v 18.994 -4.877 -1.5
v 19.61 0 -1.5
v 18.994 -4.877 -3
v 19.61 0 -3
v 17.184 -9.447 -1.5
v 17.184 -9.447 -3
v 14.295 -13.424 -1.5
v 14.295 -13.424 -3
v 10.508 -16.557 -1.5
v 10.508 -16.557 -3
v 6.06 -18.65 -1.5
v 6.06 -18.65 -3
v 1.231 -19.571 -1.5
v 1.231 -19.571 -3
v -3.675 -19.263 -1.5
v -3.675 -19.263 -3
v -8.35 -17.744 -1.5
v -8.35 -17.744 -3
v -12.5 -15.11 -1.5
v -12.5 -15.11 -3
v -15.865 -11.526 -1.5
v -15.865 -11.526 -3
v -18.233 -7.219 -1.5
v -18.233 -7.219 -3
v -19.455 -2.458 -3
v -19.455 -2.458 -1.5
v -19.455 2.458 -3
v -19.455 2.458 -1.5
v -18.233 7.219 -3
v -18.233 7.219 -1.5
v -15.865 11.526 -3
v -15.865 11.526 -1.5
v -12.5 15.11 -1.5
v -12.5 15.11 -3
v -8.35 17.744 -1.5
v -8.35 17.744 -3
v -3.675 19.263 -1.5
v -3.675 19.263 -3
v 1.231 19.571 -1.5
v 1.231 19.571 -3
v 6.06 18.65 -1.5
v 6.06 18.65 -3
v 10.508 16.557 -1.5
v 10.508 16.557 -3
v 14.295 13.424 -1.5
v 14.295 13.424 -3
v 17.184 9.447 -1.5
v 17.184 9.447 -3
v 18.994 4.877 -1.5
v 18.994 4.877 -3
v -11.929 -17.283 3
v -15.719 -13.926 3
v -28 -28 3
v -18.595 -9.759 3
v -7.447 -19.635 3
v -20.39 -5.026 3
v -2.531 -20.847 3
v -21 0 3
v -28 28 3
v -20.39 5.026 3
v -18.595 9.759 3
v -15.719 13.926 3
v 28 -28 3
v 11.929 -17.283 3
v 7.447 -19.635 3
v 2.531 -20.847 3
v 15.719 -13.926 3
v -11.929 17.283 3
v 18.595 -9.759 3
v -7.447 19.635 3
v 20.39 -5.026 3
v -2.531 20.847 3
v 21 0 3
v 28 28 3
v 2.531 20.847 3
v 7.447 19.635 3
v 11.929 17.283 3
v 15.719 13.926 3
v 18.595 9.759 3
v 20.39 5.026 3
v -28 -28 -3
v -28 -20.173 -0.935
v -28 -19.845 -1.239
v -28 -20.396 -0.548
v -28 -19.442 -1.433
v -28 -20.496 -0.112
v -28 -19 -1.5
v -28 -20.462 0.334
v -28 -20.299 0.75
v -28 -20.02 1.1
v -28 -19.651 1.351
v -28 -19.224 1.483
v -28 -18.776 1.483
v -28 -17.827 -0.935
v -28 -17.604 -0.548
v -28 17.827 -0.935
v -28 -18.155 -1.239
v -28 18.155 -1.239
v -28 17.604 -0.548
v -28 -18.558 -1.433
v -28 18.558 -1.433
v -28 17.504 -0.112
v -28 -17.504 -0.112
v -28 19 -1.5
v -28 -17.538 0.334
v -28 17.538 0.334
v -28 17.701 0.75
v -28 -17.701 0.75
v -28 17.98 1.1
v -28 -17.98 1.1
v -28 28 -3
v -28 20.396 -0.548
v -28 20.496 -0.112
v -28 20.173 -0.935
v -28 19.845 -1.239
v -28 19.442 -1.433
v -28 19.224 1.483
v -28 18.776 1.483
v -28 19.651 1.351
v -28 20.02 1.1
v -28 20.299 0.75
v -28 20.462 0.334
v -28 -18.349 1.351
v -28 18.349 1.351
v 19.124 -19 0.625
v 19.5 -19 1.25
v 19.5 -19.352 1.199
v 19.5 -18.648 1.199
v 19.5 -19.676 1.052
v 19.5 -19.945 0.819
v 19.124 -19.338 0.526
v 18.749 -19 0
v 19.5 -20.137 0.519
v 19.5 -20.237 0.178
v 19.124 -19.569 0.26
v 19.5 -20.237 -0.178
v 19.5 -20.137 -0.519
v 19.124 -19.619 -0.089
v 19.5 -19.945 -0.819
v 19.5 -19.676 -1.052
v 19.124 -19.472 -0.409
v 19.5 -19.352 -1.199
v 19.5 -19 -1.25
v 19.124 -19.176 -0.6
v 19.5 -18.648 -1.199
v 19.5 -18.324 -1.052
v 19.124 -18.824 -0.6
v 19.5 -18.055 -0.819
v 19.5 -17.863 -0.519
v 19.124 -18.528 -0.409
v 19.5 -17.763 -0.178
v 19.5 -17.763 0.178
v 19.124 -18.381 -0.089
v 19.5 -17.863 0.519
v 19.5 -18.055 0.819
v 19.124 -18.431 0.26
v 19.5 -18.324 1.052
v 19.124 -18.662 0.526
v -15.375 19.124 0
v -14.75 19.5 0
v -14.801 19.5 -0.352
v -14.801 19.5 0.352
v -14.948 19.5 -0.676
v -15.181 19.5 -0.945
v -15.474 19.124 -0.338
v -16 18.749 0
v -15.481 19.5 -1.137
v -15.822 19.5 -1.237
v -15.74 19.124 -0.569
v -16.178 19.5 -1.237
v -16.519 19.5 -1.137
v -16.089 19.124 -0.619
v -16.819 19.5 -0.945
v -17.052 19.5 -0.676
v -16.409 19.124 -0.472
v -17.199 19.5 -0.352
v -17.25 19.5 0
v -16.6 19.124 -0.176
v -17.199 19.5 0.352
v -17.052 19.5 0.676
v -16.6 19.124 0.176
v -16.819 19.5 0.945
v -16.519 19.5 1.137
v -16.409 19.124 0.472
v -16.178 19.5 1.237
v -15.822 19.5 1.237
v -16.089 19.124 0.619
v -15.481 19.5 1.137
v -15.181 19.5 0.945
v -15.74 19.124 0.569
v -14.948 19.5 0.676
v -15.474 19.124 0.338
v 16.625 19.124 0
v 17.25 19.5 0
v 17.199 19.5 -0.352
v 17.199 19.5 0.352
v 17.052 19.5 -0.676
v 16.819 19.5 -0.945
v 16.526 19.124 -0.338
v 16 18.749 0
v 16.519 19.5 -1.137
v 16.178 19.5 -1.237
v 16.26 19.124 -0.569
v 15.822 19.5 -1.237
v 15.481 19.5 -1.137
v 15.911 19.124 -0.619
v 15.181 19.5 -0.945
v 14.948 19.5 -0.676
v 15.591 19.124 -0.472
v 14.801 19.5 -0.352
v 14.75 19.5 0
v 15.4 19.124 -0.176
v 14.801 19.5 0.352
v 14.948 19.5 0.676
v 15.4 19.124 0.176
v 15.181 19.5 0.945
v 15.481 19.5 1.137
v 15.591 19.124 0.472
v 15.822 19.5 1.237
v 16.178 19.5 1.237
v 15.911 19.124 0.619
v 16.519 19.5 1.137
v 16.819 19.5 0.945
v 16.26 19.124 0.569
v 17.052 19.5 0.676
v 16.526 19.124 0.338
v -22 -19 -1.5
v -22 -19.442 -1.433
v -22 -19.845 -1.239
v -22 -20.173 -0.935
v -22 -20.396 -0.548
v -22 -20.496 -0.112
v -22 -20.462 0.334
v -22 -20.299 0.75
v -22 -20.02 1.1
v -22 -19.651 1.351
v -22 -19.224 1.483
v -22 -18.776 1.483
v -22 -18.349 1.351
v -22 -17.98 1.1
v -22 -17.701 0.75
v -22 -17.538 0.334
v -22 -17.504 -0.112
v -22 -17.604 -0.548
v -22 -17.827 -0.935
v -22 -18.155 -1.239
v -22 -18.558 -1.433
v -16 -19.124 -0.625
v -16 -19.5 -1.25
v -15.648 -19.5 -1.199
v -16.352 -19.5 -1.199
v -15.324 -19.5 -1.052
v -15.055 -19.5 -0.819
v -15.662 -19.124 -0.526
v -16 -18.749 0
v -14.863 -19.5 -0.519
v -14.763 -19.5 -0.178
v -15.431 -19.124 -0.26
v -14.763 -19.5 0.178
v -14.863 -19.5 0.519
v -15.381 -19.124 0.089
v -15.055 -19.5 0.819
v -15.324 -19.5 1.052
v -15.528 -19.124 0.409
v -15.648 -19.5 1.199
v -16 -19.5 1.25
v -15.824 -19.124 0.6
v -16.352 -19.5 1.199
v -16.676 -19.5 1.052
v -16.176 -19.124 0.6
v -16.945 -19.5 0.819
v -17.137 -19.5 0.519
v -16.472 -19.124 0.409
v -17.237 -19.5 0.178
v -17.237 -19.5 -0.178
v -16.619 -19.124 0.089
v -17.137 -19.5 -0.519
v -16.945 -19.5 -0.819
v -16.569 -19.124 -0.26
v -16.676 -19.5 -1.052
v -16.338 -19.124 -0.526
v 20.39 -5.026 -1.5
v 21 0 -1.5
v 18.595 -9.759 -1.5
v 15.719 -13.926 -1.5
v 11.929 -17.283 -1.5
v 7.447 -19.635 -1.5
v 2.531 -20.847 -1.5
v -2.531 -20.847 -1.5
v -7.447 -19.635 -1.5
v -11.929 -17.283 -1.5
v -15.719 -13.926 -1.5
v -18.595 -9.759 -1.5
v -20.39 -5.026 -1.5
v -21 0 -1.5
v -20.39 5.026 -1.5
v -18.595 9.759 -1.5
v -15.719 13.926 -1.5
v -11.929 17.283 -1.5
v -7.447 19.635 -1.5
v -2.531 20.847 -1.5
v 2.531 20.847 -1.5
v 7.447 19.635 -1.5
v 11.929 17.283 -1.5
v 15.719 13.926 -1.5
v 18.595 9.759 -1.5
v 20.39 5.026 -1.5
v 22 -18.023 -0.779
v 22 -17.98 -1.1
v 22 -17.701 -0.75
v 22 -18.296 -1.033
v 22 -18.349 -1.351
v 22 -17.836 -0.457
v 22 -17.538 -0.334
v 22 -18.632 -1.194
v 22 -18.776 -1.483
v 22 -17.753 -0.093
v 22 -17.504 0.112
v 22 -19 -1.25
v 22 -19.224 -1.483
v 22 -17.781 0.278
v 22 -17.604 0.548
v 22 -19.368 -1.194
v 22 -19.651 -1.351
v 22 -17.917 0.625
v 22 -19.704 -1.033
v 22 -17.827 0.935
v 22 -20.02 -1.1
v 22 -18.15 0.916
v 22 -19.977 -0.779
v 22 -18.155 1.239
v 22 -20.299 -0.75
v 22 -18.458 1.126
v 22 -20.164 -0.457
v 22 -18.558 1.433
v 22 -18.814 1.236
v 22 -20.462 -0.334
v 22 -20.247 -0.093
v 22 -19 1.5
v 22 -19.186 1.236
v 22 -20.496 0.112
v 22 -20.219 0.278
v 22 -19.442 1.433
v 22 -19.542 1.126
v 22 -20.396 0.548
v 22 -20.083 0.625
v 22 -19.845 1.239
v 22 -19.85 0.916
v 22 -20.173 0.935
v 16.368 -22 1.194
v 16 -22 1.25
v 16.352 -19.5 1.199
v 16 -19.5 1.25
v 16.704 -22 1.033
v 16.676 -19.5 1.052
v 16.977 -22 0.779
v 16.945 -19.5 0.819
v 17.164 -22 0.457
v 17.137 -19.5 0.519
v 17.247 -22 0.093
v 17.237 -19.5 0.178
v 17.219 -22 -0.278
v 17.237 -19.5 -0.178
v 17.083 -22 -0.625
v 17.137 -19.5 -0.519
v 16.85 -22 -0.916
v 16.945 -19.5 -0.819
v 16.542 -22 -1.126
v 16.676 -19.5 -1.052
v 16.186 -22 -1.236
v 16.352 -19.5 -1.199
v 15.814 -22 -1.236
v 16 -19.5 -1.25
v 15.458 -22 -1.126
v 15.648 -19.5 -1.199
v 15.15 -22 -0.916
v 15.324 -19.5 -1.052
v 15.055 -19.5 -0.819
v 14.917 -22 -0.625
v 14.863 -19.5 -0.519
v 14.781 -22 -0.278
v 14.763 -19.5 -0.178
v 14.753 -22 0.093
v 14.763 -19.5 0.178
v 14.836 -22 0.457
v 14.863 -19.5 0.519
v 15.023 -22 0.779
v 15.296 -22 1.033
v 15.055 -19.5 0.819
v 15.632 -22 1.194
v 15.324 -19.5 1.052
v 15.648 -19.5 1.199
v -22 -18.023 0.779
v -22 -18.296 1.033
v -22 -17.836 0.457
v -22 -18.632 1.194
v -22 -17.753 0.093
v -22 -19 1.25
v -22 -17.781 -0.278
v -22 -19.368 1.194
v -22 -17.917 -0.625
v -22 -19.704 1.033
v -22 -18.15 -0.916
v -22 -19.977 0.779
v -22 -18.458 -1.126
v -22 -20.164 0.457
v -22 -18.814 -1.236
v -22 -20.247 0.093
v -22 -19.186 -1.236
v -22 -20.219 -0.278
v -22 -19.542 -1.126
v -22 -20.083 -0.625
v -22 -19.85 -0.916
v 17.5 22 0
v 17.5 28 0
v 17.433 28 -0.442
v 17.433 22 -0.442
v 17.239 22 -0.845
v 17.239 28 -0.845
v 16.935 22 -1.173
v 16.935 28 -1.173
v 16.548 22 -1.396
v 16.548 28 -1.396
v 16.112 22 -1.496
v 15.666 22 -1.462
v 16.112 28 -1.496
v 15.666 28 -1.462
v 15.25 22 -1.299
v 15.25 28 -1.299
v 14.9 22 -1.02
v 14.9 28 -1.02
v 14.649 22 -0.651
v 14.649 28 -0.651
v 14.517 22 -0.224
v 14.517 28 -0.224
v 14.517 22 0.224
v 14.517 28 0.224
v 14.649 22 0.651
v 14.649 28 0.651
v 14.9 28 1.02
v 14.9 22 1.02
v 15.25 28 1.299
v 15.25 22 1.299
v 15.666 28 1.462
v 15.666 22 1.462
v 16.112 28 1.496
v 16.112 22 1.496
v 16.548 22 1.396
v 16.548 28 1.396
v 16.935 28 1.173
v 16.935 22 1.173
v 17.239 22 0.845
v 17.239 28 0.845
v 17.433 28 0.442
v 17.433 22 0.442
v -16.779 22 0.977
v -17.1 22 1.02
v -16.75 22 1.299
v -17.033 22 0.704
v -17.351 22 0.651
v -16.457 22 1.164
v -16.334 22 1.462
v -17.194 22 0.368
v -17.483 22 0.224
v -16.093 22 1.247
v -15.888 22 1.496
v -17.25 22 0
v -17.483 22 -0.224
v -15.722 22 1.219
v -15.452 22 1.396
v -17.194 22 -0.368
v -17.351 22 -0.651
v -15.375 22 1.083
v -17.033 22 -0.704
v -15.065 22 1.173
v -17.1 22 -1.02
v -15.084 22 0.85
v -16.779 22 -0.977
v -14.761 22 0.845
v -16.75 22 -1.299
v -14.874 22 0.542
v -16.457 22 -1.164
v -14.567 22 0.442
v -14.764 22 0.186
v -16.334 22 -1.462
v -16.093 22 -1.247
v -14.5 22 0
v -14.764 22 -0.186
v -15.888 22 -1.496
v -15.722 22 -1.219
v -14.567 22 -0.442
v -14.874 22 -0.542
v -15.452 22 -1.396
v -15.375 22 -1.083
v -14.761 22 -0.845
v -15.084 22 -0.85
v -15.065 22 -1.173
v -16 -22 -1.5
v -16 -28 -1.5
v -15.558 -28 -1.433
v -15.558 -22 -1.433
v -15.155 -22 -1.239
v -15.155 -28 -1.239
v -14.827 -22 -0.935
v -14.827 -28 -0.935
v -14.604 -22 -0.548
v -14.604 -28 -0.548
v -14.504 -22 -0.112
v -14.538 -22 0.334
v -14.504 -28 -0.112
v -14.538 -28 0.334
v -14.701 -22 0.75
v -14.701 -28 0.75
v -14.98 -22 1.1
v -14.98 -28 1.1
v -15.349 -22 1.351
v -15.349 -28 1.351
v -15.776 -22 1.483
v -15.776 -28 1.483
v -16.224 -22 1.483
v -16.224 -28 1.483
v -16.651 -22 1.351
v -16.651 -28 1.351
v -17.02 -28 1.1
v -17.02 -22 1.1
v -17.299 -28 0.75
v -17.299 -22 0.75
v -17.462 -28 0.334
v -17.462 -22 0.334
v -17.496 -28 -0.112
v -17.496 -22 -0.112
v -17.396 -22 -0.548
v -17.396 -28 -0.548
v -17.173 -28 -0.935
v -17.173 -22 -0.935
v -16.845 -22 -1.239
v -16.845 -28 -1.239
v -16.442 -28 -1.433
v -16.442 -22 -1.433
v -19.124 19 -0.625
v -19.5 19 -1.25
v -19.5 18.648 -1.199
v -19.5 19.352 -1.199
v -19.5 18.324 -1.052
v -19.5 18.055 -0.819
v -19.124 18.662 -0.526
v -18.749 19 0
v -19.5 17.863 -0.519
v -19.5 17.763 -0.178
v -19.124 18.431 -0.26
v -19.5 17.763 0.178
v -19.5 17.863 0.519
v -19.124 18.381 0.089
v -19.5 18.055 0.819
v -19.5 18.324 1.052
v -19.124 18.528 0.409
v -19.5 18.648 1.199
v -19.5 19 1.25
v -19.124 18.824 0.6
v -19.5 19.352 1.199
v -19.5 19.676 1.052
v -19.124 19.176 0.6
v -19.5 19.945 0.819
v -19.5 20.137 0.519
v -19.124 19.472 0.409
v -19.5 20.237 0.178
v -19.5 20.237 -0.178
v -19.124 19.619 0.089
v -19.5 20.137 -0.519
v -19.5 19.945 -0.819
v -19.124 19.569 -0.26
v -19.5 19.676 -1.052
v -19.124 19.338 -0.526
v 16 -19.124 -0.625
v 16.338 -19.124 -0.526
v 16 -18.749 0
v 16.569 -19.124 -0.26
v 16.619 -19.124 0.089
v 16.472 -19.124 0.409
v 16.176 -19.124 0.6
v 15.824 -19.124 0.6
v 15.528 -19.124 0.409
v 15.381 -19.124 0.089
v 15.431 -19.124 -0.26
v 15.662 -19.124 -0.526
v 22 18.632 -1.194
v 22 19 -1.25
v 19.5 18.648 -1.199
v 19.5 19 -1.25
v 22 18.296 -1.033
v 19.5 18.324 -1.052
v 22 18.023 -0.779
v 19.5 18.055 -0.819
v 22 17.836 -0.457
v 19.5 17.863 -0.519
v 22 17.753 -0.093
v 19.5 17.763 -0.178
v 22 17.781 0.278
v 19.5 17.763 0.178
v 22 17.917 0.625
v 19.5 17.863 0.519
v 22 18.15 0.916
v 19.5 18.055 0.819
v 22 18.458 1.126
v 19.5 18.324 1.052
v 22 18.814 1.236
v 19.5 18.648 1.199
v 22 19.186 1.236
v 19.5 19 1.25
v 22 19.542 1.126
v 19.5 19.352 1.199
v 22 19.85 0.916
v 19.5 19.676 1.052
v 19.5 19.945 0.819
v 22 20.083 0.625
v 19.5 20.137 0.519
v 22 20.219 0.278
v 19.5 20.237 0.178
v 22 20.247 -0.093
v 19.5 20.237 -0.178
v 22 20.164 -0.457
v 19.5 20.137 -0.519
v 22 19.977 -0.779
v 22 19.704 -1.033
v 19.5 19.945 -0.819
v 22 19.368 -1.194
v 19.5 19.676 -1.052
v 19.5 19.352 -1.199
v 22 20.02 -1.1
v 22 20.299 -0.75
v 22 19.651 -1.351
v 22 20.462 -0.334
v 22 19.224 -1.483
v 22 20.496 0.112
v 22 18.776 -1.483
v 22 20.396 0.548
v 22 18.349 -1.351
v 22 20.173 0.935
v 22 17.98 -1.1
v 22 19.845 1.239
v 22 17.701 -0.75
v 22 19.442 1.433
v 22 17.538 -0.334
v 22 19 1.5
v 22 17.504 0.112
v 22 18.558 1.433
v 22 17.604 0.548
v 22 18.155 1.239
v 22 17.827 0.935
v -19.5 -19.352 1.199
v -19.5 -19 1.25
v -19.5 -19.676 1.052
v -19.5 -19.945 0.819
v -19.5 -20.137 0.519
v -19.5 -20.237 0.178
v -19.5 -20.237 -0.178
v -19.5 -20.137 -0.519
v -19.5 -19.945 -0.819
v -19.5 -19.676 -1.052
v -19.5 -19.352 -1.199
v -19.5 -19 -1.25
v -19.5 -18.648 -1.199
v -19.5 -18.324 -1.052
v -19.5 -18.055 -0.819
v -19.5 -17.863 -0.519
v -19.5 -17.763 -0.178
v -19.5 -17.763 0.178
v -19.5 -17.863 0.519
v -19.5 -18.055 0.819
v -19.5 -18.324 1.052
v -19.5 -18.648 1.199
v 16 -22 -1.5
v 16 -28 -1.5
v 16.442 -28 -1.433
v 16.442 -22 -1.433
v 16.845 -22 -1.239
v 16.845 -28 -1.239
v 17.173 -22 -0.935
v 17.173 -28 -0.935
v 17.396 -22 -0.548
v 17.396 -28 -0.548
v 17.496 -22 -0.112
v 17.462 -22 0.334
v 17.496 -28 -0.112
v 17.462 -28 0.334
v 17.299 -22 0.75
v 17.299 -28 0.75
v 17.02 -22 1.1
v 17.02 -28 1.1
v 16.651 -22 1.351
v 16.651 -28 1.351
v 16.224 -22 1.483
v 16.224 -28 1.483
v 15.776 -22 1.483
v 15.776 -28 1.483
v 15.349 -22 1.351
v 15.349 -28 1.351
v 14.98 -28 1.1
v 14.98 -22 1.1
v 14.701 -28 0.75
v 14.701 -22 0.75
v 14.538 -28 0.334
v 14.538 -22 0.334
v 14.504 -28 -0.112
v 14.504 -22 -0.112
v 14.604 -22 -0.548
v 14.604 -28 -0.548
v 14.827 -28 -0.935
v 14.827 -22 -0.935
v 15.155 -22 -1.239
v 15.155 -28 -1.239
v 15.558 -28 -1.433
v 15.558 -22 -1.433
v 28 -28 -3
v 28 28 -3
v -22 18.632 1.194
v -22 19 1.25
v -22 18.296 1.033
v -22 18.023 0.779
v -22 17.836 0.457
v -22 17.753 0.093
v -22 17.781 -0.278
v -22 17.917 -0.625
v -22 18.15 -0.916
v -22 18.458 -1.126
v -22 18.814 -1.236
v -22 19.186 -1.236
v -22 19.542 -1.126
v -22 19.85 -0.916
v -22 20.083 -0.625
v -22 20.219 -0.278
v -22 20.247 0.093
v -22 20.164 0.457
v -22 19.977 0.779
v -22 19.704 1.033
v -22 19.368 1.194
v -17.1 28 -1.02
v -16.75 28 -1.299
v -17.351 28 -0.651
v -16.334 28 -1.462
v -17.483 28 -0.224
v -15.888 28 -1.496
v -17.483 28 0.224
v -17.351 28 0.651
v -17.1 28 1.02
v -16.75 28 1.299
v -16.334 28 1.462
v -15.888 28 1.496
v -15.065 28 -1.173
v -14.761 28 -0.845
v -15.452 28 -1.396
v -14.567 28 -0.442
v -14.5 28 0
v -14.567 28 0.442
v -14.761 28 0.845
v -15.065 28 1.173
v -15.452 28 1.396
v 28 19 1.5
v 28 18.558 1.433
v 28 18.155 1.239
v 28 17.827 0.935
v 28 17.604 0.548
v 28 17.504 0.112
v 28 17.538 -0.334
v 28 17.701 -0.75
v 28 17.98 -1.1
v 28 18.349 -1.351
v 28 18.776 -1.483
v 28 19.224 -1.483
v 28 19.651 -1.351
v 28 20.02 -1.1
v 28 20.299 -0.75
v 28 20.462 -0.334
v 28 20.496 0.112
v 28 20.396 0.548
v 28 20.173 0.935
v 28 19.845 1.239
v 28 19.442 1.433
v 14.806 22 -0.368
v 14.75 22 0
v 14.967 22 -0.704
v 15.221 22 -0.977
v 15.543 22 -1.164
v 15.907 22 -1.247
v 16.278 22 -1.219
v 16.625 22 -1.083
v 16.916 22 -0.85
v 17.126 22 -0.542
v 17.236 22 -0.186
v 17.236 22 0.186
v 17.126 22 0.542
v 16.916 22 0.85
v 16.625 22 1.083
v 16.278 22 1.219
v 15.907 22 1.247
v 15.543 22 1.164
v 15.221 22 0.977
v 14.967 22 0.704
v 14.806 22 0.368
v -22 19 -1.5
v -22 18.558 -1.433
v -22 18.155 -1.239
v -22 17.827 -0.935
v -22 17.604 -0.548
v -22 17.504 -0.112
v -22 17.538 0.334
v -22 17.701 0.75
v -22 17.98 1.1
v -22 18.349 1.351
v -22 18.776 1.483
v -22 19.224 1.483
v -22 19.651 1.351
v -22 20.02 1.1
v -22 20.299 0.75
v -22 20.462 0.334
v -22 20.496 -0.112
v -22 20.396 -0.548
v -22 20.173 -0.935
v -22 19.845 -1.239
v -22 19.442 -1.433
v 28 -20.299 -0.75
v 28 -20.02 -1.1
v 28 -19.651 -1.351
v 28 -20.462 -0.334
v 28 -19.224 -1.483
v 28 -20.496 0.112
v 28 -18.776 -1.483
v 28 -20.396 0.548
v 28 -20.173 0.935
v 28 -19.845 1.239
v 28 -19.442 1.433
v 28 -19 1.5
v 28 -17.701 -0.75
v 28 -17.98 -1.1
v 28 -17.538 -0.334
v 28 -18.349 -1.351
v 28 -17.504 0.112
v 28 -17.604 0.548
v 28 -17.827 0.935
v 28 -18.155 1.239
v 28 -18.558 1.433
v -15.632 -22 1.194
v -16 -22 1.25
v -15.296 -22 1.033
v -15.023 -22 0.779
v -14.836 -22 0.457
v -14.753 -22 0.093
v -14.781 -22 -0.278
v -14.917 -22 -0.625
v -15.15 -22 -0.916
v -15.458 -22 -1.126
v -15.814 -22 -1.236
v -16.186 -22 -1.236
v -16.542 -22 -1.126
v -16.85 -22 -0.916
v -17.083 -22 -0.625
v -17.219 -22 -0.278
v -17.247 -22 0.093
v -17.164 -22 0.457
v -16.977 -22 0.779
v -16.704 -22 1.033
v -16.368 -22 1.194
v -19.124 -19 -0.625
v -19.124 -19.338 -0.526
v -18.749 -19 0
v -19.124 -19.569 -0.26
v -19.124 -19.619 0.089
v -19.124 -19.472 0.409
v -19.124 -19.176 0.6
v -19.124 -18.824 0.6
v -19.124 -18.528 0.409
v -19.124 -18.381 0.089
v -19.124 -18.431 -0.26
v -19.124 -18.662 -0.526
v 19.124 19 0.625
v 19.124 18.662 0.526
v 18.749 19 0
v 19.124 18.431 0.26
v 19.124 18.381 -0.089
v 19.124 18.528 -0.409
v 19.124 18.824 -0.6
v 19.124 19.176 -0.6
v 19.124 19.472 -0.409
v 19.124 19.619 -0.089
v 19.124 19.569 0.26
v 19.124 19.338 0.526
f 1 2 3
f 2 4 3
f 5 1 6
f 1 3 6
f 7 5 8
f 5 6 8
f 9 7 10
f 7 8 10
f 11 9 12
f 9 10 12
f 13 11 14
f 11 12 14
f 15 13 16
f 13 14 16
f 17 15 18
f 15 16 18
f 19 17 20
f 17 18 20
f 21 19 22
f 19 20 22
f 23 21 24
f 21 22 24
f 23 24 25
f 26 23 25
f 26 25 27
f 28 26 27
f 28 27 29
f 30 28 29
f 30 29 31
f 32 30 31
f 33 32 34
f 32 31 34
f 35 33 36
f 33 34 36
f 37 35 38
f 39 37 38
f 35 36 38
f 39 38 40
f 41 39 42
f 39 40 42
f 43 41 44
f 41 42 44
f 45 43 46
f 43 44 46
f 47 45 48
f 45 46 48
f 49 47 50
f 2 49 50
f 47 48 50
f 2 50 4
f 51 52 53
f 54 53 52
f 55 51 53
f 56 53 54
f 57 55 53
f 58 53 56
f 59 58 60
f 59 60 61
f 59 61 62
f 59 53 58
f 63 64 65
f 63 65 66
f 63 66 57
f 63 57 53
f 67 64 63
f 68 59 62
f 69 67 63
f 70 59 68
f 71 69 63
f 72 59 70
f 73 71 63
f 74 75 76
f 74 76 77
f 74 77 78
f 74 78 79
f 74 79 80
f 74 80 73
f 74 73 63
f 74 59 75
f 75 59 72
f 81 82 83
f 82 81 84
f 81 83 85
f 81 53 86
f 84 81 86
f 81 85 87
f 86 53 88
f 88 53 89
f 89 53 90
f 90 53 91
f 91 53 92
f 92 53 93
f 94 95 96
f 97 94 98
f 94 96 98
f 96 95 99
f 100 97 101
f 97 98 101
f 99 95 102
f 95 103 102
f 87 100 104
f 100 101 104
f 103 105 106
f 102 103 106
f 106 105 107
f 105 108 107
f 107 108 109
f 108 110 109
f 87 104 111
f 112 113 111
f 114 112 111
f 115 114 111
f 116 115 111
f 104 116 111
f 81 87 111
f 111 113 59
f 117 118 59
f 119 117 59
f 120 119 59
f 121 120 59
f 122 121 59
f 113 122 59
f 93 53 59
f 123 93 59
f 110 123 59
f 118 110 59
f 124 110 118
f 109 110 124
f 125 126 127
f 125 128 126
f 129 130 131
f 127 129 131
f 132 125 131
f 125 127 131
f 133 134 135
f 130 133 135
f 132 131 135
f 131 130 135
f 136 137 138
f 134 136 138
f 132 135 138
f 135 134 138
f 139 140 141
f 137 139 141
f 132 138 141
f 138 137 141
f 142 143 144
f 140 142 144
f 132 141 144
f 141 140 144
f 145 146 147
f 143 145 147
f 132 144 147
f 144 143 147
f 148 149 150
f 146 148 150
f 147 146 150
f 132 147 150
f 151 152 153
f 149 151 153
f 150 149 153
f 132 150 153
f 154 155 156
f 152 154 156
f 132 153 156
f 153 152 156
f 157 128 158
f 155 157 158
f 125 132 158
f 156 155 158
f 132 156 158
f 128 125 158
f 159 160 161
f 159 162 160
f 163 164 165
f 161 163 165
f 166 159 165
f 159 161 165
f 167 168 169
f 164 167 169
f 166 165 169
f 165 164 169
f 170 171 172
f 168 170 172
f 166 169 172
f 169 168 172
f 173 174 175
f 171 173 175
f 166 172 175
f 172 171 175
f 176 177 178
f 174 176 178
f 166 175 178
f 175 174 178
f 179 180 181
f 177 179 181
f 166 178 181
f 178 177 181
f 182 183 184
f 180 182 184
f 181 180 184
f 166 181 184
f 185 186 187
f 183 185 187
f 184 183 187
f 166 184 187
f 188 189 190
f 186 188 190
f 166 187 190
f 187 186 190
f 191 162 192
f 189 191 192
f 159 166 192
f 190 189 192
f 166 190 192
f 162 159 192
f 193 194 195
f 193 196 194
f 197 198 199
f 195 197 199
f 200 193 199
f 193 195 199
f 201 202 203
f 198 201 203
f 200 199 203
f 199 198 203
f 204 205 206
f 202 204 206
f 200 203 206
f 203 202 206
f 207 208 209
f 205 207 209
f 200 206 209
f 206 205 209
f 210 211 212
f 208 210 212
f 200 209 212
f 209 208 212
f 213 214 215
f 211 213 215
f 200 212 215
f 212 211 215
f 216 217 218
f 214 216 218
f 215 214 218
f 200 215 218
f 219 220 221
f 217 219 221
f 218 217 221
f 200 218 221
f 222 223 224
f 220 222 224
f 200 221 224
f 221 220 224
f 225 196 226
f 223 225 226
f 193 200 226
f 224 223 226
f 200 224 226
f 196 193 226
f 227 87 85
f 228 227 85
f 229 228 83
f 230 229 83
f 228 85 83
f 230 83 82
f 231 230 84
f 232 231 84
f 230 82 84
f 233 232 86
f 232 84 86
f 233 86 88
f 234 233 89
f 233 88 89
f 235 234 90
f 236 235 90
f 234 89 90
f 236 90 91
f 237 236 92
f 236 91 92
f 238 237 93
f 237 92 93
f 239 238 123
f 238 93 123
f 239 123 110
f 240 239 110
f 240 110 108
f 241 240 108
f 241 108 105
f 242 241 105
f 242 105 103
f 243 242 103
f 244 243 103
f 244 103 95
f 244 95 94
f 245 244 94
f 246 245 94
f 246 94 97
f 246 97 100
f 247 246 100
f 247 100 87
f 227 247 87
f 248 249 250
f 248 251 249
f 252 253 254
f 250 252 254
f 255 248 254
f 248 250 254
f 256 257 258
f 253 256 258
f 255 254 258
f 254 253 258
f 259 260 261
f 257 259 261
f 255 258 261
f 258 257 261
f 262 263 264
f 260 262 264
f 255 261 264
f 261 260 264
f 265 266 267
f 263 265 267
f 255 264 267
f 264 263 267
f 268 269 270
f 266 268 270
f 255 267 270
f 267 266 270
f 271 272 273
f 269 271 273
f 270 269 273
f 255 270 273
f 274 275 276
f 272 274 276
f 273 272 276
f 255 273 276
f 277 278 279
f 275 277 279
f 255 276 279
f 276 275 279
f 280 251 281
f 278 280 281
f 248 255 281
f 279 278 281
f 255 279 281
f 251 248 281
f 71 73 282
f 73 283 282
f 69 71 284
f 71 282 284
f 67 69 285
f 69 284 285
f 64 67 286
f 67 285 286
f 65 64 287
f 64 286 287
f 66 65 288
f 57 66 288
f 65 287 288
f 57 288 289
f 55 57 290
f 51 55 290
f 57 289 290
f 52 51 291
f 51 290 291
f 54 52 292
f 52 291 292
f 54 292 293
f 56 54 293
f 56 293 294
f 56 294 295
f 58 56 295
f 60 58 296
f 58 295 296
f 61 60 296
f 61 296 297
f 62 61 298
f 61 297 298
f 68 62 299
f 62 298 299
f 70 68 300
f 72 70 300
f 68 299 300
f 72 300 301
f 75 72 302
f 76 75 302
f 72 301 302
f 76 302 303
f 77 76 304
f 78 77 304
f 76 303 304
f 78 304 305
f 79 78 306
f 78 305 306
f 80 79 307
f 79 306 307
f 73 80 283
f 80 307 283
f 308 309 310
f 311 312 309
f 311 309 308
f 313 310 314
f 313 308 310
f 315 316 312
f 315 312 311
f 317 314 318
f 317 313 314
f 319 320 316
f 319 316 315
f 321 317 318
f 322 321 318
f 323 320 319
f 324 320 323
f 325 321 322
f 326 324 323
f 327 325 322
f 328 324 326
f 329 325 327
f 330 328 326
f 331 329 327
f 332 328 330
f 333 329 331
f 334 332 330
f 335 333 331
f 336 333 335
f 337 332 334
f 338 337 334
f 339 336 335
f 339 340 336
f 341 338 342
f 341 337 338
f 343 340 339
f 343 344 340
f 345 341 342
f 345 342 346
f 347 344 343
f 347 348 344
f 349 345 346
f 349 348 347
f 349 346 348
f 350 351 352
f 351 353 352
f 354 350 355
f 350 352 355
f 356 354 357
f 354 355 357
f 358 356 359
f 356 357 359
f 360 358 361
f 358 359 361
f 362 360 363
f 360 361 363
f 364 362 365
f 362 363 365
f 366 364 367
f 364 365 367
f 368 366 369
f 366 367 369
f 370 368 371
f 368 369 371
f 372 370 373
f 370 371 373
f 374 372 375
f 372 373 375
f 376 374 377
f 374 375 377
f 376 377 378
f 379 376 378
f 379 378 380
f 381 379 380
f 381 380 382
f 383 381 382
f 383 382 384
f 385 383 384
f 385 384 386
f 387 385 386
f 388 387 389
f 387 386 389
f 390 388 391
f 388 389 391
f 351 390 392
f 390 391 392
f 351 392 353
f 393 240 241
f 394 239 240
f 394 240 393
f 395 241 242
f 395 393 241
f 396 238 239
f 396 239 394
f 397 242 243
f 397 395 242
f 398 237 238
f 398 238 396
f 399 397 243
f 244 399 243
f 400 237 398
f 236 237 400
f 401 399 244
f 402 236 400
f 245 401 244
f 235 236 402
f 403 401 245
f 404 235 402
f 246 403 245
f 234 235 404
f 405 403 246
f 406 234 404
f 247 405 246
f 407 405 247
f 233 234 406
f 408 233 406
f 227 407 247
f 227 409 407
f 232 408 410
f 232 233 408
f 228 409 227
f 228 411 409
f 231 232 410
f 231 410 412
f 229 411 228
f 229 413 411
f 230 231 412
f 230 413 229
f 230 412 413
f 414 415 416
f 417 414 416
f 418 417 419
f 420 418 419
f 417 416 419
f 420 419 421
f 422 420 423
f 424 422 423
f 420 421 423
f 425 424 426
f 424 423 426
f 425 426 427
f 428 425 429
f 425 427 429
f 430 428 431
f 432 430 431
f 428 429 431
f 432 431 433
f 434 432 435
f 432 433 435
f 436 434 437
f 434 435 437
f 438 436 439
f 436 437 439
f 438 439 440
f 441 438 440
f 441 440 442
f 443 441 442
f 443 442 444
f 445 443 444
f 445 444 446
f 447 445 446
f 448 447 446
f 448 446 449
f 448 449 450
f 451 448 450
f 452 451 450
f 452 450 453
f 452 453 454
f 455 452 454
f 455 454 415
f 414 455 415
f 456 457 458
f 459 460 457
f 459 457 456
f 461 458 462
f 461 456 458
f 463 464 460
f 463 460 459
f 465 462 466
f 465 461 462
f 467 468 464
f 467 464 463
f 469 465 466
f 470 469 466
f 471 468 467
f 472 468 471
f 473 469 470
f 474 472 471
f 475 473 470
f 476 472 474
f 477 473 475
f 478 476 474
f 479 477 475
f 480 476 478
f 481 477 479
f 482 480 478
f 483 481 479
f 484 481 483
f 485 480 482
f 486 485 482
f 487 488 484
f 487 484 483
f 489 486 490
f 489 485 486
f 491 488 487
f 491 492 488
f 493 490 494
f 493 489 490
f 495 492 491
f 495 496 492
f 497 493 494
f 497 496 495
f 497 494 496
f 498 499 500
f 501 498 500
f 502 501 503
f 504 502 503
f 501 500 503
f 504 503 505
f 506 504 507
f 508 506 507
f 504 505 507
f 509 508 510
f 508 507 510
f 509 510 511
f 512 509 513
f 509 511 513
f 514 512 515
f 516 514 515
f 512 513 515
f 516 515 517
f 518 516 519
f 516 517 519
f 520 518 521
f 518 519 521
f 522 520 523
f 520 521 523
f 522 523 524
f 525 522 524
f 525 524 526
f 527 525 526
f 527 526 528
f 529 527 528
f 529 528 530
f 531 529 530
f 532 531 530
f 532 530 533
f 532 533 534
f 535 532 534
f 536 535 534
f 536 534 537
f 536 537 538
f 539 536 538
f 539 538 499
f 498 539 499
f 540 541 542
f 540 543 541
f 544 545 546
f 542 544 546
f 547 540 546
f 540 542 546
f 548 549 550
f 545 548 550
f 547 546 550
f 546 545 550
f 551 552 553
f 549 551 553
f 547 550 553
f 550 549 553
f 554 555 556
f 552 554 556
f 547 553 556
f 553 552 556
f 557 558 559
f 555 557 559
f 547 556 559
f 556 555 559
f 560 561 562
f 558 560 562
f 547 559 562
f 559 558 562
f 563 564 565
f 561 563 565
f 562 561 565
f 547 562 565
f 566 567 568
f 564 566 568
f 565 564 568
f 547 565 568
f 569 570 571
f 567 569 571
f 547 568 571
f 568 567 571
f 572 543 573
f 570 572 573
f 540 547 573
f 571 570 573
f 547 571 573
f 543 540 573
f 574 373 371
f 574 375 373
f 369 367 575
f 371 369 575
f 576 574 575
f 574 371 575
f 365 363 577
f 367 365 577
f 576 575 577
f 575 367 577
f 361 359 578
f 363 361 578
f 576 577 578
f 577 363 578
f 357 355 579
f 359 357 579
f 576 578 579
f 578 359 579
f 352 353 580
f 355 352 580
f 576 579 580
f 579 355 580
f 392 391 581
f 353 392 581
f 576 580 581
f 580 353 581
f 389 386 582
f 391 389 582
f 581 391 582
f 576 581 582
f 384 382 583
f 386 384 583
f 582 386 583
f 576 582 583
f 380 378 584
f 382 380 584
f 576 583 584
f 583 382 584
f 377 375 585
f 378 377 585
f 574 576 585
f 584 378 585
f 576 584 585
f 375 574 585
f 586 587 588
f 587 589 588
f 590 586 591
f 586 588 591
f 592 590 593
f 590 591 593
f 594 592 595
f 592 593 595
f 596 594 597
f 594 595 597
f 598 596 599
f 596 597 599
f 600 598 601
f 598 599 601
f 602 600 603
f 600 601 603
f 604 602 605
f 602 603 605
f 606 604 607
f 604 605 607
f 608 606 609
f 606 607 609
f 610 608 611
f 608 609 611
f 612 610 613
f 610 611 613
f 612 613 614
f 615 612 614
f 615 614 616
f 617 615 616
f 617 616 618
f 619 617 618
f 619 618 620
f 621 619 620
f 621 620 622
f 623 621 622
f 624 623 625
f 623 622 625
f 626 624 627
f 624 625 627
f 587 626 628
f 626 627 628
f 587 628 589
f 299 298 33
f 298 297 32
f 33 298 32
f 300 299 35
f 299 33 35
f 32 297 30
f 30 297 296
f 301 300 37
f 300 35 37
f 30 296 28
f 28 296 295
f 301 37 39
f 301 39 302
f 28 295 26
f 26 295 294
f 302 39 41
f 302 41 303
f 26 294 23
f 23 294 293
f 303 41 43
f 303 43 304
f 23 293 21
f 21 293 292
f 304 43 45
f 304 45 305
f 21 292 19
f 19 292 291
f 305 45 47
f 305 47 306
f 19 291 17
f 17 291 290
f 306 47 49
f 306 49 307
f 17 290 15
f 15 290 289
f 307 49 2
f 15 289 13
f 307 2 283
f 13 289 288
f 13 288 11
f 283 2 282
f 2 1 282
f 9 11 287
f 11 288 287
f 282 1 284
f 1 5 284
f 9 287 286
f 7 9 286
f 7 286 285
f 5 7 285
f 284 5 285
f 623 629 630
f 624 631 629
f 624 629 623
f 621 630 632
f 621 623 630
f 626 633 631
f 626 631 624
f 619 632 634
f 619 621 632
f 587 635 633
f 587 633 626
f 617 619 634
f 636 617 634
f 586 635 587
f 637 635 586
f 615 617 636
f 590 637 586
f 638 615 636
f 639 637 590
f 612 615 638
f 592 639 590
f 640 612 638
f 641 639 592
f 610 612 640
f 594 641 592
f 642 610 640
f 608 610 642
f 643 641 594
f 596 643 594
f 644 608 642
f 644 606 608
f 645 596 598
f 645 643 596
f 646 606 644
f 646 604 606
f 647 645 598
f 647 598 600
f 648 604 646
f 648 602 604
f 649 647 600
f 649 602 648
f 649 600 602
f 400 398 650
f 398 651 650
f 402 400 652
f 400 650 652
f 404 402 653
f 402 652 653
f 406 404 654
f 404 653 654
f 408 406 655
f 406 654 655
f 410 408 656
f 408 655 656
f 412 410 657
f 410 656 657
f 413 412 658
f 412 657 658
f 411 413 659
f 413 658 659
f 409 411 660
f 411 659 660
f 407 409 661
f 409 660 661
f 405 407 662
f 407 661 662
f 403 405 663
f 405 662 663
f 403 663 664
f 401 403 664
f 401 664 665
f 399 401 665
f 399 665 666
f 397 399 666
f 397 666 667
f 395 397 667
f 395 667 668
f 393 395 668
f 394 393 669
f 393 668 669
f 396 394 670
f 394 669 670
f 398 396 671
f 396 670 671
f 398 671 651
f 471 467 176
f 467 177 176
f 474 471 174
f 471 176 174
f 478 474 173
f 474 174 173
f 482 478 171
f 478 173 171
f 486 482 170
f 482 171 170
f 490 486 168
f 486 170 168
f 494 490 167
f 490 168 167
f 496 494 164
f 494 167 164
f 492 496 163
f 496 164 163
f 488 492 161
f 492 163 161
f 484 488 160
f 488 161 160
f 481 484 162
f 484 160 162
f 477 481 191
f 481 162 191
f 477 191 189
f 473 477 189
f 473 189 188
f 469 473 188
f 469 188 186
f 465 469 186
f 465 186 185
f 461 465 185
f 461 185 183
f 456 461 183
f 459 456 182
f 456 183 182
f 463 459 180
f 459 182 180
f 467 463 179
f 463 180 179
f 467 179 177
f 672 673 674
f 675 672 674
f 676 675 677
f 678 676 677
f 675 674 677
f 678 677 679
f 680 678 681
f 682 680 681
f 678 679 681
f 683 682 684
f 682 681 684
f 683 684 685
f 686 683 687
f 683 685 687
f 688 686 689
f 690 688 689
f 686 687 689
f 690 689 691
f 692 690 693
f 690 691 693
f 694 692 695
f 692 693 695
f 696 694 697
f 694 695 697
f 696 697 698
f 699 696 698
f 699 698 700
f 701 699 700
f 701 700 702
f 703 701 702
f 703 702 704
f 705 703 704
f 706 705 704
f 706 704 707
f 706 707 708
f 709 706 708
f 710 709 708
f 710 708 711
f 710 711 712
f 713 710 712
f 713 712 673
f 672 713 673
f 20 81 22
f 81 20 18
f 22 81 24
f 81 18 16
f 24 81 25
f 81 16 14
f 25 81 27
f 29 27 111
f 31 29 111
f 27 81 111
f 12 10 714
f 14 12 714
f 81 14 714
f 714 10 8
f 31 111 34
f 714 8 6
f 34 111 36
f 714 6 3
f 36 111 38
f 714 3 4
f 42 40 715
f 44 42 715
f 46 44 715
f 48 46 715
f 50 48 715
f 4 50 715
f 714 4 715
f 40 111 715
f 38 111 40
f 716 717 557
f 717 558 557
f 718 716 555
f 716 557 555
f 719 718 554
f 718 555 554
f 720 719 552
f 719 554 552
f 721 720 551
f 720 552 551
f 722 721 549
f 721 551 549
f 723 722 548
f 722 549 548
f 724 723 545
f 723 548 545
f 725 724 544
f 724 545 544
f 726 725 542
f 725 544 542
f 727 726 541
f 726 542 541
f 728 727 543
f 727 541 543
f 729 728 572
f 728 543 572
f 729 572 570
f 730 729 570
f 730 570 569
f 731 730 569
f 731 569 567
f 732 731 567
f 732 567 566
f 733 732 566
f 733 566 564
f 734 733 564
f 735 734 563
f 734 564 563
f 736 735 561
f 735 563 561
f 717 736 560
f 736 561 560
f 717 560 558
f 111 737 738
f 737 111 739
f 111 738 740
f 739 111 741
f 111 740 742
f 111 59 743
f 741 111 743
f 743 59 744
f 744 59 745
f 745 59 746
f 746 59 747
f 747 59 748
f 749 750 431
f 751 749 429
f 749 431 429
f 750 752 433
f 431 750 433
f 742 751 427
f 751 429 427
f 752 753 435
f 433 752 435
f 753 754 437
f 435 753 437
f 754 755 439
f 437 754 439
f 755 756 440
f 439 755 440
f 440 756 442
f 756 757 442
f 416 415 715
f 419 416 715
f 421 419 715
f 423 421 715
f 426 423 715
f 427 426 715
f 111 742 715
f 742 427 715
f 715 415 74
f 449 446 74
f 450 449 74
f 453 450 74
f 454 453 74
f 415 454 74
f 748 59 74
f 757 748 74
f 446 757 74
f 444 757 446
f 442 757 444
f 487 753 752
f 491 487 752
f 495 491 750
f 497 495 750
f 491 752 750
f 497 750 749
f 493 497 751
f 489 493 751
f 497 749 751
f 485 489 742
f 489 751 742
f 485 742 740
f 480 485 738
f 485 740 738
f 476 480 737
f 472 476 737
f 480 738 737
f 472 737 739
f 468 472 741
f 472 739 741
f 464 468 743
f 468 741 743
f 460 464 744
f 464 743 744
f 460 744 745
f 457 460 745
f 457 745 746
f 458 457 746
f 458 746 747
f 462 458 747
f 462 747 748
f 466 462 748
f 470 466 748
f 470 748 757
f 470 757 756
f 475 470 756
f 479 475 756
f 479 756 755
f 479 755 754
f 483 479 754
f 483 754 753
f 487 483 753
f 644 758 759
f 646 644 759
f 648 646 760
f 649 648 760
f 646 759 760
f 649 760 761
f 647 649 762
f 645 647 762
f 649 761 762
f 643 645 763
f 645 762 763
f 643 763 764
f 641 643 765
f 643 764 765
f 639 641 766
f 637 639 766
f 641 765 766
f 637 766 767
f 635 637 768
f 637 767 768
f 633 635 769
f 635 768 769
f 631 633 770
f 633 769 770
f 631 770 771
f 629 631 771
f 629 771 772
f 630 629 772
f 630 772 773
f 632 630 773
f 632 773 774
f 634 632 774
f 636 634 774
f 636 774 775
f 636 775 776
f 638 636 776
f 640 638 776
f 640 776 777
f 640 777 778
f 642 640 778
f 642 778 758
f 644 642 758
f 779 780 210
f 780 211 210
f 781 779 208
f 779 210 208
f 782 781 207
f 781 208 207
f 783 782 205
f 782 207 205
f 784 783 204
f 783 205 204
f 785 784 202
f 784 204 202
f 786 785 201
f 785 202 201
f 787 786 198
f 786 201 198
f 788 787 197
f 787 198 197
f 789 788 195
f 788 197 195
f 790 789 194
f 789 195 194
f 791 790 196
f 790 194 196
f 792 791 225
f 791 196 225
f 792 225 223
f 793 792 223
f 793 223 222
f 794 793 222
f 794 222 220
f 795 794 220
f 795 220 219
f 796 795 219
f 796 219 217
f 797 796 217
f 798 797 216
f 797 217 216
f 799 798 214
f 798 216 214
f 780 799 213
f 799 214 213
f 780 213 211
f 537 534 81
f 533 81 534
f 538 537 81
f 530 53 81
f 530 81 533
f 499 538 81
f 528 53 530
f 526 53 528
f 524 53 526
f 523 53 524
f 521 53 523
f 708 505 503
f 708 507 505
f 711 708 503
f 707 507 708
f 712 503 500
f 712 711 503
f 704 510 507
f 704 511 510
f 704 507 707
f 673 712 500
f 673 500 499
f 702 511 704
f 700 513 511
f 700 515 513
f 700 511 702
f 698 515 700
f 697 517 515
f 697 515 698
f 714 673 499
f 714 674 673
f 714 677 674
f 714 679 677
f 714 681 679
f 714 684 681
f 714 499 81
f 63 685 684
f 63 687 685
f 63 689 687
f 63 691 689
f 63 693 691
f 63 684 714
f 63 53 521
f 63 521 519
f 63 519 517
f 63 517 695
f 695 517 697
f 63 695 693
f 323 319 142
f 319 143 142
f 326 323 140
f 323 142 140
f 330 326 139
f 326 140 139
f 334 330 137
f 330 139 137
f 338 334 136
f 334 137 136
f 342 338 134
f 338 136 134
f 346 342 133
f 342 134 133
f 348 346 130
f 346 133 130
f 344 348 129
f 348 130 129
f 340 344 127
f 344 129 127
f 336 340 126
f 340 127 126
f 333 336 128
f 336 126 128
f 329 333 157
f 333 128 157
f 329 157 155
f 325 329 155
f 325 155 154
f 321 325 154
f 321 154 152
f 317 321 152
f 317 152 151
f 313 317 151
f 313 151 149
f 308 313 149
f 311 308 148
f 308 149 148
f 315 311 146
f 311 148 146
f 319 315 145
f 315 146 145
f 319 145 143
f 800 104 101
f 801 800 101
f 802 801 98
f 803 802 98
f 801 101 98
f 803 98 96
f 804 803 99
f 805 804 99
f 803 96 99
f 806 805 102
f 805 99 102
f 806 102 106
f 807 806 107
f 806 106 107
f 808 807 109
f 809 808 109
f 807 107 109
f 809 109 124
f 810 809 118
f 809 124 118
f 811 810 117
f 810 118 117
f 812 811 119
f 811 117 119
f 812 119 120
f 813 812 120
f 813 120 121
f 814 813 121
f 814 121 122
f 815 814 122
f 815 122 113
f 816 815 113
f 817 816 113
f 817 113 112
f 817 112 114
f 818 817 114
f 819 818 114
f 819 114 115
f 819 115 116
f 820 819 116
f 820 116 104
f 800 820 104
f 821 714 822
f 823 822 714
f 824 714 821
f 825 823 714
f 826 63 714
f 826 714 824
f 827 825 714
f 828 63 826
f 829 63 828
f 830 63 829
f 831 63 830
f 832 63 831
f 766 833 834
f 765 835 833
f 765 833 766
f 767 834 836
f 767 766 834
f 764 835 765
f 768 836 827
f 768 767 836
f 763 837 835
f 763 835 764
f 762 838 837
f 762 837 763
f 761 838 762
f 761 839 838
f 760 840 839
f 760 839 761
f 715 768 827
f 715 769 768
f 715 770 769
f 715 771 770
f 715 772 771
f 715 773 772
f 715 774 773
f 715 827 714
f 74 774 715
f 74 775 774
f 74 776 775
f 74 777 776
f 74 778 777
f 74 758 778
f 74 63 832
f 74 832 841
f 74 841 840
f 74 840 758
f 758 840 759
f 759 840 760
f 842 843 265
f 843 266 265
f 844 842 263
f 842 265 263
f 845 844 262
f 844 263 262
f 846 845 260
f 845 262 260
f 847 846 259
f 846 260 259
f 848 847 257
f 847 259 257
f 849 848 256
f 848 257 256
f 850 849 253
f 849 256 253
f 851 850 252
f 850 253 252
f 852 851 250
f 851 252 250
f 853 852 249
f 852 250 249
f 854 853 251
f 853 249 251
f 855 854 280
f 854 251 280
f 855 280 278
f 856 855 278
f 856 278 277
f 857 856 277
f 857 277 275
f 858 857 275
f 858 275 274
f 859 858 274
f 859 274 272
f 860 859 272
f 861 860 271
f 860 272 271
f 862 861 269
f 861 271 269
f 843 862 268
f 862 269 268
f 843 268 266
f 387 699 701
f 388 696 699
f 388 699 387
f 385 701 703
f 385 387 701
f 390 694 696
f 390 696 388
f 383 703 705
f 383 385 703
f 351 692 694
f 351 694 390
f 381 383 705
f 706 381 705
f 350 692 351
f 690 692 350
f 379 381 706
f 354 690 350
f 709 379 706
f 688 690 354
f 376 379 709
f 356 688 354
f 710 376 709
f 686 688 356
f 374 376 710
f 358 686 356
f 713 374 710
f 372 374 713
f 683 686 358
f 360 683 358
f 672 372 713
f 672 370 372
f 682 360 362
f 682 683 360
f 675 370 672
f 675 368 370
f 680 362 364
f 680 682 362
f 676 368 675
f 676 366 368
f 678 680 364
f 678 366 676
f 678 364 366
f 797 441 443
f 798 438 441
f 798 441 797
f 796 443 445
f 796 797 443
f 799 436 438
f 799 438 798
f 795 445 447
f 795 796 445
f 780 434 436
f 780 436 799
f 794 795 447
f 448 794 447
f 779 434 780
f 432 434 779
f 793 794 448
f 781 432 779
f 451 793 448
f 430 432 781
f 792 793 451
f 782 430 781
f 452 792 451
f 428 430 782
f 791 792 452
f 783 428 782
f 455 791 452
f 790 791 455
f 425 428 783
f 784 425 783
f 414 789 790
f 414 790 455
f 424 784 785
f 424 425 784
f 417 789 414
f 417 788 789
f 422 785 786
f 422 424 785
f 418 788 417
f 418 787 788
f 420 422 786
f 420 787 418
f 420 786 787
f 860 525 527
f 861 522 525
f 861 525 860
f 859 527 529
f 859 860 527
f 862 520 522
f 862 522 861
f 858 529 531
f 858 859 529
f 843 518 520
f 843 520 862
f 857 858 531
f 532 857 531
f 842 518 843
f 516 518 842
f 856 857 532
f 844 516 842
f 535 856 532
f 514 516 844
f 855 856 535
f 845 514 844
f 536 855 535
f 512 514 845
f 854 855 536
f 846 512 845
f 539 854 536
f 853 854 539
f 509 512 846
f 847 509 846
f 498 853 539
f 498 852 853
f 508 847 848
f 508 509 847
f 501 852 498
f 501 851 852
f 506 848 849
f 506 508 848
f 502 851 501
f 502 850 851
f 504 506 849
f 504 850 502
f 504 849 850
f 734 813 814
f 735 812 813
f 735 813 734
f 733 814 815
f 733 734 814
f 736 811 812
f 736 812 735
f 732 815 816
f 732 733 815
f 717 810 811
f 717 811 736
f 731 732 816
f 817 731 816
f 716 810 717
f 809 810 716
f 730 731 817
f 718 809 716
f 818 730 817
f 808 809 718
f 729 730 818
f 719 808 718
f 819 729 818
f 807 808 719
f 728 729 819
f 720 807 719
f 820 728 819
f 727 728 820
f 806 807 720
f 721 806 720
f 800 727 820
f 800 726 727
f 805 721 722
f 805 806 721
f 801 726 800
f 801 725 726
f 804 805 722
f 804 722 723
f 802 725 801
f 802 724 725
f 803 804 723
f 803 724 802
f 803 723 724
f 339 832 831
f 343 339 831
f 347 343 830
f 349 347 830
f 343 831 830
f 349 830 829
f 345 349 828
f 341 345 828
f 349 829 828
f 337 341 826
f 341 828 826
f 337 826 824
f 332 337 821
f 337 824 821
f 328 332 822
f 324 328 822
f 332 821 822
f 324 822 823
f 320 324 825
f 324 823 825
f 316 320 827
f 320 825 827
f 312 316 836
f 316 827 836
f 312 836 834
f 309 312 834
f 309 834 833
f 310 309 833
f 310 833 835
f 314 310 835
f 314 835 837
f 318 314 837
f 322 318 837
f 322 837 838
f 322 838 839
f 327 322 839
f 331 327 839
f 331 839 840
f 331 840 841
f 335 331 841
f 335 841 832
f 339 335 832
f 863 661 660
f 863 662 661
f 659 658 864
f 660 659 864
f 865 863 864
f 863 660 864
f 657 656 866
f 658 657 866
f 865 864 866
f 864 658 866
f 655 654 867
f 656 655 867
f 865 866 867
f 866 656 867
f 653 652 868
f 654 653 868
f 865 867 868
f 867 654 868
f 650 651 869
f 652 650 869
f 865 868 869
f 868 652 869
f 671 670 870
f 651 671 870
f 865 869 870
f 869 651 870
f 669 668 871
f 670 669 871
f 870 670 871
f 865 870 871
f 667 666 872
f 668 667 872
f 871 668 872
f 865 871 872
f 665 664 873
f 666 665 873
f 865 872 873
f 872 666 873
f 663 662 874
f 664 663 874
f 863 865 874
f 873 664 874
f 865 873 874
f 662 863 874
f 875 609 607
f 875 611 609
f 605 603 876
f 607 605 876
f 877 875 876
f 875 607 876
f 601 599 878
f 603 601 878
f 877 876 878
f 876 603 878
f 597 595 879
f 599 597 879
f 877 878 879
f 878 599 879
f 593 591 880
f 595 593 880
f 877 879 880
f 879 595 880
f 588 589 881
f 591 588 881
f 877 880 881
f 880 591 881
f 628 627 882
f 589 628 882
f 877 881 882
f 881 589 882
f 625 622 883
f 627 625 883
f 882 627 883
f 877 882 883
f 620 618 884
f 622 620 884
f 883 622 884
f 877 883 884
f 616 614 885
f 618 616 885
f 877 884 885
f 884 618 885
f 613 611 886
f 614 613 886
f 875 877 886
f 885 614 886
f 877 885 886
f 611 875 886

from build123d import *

# Parameters (mm, degrees)
SKETCH_2_W                     = 56
SKETCH_2_H                     = 56
EXTRUDE_1_DEPTH                = 3
M3X0_5_1_D                     = 2.5
M3X0_5_1_DEPTH                 = 8.5
M3X0_5_1_CBORE_D               = 3
M3X0_5_1_CBORE_DEPTH           = 6
M3X0_5_1_TIP                   = 0.751075774
M3X0_5_1_ON_FACE_2_D           = 2.5
M3X0_5_1_ON_FACE_2_DEPTH       = 8.5
M3X0_5_1_ON_FACE_2_CBORE_D     = 3
M3X0_5_1_ON_FACE_2_CBORE_DEPTH = 6
M3X0_5_1_ON_FACE_2_TIP         = 0.751075774
M3X0_5_1_ON_FACE_3_D           = 2.5
M3X0_5_1_ON_FACE_3_DEPTH       = 8.5
M3X0_5_1_ON_FACE_3_CBORE_D     = 3
M3X0_5_1_ON_FACE_3_CBORE_DEPTH = 6
M3X0_5_1_ON_FACE_3_TIP         = 0.751075774
M3X0_5_1_ON_FACE_4_D           = 2.5
M3X0_5_1_ON_FACE_4_DEPTH       = 8.5
M3X0_5_1_ON_FACE_4_CBORE_D     = 3
M3X0_5_1_ON_FACE_4_CBORE_DEPTH = 6
M3X0_5_1_ON_FACE_4_TIP         = 0.751075774


with BuildPart() as part:
    # ｽｹｯﾁ2 → ﾎﾞｽ - 押し出し1 (new, symmetric)
    with BuildSketch(Plane.XY):
        Rectangle(SKETCH_2_W, SKETCH_2_H)
    extrude(amount=EXTRUDE_1_DEPTH, both=True)

    # ｽｹｯﾁ3 → ｶｯﾄ - 回転1 (revolve, cut)
    with BuildSketch(Plane(origin=(0, 0, 0), x_dir=(0, 0, -1), z_dir=(1, 0, 0)), mode=Mode.PRIVATE) as cut_revolve_1_sk:
        Polygon((-3, 21), (1.5, 21), (1.5, 19.61), (3, 19.61), (3, 0), (-3, 0), align=None)
    revolve(cut_revolve_1_sk.sketch.rotate(Axis((0, 0, 0), (0, 0, -1)), 90), axis=Axis((0, 0, 0), (0, 0, -1)), mode=Mode.SUBTRACT)

    # M3x0.5 ねじ穴1
    with Locations(Plane(origin=(-16, 28, 0), x_dir=(1, 0, 0), z_dir=(0, 1, 0))):
        with Locations((0, 0), (32, 0)):
            CounterBoreHole(M3X0_5_1_D / 2, M3X0_5_1_CBORE_D / 2, M3X0_5_1_CBORE_DEPTH, depth=M3X0_5_1_DEPTH)
            with Locations((0, 0, -(M3X0_5_1_DEPTH + M3X0_5_1_TIP / 2))):  # 118° drill point
                Cone(0, M3X0_5_1_D / 2, M3X0_5_1_TIP, mode=Mode.SUBTRACT)

    # M3x0.5 ねじ穴1 on face 2
    with Locations(Plane(origin=(28, 19, 0), x_dir=(0, 0, 1), z_dir=(1, 0, 0))):
        with Locations((0, 0), (0, 38)):
            CounterBoreHole(M3X0_5_1_ON_FACE_2_D / 2, M3X0_5_1_ON_FACE_2_CBORE_D / 2, M3X0_5_1_ON_FACE_2_CBORE_DEPTH, depth=M3X0_5_1_ON_FACE_2_DEPTH)
            with Locations((0, 0, -(M3X0_5_1_ON_FACE_2_DEPTH + M3X0_5_1_ON_FACE_2_TIP / 2))):  # 118° drill point
                Cone(0, M3X0_5_1_ON_FACE_2_D / 2, M3X0_5_1_ON_FACE_2_TIP, mode=Mode.SUBTRACT)

    # M3x0.5 ねじ穴1 on face 3
    with Locations(Plane(origin=(16, -28, 0), x_dir=(0, 0, -1), z_dir=(0, -1, 0))):
        with Locations((0, 0), (0, -32)):
            CounterBoreHole(M3X0_5_1_ON_FACE_3_D / 2, M3X0_5_1_ON_FACE_3_CBORE_D / 2, M3X0_5_1_ON_FACE_3_CBORE_DEPTH, depth=M3X0_5_1_ON_FACE_3_DEPTH)
            with Locations((0, 0, -(M3X0_5_1_ON_FACE_3_DEPTH + M3X0_5_1_ON_FACE_3_TIP / 2))):  # 118° drill point
                Cone(0, M3X0_5_1_ON_FACE_3_D / 2, M3X0_5_1_ON_FACE_3_TIP, mode=Mode.SUBTRACT)

    # M3x0.5 ねじ穴1 on face 4
    with Locations(Plane(origin=(-28, 19, 0), x_dir=(0, 0, -1), z_dir=(-1, 0, 0))):
        with Locations((0, 0), (0, 38)):
            CounterBoreHole(M3X0_5_1_ON_FACE_4_D / 2, M3X0_5_1_ON_FACE_4_CBORE_D / 2, M3X0_5_1_ON_FACE_4_CBORE_DEPTH, depth=M3X0_5_1_ON_FACE_4_DEPTH)
            with Locations((0, 0, -(M3X0_5_1_ON_FACE_4_DEPTH + M3X0_5_1_ON_FACE_4_TIP / 2))):  # 118° drill point
                Cone(0, M3X0_5_1_ON_FACE_4_D / 2, M3X0_5_1_ON_FACE_4_TIP, mode=Mode.SUBTRACT)


solid = part.part
